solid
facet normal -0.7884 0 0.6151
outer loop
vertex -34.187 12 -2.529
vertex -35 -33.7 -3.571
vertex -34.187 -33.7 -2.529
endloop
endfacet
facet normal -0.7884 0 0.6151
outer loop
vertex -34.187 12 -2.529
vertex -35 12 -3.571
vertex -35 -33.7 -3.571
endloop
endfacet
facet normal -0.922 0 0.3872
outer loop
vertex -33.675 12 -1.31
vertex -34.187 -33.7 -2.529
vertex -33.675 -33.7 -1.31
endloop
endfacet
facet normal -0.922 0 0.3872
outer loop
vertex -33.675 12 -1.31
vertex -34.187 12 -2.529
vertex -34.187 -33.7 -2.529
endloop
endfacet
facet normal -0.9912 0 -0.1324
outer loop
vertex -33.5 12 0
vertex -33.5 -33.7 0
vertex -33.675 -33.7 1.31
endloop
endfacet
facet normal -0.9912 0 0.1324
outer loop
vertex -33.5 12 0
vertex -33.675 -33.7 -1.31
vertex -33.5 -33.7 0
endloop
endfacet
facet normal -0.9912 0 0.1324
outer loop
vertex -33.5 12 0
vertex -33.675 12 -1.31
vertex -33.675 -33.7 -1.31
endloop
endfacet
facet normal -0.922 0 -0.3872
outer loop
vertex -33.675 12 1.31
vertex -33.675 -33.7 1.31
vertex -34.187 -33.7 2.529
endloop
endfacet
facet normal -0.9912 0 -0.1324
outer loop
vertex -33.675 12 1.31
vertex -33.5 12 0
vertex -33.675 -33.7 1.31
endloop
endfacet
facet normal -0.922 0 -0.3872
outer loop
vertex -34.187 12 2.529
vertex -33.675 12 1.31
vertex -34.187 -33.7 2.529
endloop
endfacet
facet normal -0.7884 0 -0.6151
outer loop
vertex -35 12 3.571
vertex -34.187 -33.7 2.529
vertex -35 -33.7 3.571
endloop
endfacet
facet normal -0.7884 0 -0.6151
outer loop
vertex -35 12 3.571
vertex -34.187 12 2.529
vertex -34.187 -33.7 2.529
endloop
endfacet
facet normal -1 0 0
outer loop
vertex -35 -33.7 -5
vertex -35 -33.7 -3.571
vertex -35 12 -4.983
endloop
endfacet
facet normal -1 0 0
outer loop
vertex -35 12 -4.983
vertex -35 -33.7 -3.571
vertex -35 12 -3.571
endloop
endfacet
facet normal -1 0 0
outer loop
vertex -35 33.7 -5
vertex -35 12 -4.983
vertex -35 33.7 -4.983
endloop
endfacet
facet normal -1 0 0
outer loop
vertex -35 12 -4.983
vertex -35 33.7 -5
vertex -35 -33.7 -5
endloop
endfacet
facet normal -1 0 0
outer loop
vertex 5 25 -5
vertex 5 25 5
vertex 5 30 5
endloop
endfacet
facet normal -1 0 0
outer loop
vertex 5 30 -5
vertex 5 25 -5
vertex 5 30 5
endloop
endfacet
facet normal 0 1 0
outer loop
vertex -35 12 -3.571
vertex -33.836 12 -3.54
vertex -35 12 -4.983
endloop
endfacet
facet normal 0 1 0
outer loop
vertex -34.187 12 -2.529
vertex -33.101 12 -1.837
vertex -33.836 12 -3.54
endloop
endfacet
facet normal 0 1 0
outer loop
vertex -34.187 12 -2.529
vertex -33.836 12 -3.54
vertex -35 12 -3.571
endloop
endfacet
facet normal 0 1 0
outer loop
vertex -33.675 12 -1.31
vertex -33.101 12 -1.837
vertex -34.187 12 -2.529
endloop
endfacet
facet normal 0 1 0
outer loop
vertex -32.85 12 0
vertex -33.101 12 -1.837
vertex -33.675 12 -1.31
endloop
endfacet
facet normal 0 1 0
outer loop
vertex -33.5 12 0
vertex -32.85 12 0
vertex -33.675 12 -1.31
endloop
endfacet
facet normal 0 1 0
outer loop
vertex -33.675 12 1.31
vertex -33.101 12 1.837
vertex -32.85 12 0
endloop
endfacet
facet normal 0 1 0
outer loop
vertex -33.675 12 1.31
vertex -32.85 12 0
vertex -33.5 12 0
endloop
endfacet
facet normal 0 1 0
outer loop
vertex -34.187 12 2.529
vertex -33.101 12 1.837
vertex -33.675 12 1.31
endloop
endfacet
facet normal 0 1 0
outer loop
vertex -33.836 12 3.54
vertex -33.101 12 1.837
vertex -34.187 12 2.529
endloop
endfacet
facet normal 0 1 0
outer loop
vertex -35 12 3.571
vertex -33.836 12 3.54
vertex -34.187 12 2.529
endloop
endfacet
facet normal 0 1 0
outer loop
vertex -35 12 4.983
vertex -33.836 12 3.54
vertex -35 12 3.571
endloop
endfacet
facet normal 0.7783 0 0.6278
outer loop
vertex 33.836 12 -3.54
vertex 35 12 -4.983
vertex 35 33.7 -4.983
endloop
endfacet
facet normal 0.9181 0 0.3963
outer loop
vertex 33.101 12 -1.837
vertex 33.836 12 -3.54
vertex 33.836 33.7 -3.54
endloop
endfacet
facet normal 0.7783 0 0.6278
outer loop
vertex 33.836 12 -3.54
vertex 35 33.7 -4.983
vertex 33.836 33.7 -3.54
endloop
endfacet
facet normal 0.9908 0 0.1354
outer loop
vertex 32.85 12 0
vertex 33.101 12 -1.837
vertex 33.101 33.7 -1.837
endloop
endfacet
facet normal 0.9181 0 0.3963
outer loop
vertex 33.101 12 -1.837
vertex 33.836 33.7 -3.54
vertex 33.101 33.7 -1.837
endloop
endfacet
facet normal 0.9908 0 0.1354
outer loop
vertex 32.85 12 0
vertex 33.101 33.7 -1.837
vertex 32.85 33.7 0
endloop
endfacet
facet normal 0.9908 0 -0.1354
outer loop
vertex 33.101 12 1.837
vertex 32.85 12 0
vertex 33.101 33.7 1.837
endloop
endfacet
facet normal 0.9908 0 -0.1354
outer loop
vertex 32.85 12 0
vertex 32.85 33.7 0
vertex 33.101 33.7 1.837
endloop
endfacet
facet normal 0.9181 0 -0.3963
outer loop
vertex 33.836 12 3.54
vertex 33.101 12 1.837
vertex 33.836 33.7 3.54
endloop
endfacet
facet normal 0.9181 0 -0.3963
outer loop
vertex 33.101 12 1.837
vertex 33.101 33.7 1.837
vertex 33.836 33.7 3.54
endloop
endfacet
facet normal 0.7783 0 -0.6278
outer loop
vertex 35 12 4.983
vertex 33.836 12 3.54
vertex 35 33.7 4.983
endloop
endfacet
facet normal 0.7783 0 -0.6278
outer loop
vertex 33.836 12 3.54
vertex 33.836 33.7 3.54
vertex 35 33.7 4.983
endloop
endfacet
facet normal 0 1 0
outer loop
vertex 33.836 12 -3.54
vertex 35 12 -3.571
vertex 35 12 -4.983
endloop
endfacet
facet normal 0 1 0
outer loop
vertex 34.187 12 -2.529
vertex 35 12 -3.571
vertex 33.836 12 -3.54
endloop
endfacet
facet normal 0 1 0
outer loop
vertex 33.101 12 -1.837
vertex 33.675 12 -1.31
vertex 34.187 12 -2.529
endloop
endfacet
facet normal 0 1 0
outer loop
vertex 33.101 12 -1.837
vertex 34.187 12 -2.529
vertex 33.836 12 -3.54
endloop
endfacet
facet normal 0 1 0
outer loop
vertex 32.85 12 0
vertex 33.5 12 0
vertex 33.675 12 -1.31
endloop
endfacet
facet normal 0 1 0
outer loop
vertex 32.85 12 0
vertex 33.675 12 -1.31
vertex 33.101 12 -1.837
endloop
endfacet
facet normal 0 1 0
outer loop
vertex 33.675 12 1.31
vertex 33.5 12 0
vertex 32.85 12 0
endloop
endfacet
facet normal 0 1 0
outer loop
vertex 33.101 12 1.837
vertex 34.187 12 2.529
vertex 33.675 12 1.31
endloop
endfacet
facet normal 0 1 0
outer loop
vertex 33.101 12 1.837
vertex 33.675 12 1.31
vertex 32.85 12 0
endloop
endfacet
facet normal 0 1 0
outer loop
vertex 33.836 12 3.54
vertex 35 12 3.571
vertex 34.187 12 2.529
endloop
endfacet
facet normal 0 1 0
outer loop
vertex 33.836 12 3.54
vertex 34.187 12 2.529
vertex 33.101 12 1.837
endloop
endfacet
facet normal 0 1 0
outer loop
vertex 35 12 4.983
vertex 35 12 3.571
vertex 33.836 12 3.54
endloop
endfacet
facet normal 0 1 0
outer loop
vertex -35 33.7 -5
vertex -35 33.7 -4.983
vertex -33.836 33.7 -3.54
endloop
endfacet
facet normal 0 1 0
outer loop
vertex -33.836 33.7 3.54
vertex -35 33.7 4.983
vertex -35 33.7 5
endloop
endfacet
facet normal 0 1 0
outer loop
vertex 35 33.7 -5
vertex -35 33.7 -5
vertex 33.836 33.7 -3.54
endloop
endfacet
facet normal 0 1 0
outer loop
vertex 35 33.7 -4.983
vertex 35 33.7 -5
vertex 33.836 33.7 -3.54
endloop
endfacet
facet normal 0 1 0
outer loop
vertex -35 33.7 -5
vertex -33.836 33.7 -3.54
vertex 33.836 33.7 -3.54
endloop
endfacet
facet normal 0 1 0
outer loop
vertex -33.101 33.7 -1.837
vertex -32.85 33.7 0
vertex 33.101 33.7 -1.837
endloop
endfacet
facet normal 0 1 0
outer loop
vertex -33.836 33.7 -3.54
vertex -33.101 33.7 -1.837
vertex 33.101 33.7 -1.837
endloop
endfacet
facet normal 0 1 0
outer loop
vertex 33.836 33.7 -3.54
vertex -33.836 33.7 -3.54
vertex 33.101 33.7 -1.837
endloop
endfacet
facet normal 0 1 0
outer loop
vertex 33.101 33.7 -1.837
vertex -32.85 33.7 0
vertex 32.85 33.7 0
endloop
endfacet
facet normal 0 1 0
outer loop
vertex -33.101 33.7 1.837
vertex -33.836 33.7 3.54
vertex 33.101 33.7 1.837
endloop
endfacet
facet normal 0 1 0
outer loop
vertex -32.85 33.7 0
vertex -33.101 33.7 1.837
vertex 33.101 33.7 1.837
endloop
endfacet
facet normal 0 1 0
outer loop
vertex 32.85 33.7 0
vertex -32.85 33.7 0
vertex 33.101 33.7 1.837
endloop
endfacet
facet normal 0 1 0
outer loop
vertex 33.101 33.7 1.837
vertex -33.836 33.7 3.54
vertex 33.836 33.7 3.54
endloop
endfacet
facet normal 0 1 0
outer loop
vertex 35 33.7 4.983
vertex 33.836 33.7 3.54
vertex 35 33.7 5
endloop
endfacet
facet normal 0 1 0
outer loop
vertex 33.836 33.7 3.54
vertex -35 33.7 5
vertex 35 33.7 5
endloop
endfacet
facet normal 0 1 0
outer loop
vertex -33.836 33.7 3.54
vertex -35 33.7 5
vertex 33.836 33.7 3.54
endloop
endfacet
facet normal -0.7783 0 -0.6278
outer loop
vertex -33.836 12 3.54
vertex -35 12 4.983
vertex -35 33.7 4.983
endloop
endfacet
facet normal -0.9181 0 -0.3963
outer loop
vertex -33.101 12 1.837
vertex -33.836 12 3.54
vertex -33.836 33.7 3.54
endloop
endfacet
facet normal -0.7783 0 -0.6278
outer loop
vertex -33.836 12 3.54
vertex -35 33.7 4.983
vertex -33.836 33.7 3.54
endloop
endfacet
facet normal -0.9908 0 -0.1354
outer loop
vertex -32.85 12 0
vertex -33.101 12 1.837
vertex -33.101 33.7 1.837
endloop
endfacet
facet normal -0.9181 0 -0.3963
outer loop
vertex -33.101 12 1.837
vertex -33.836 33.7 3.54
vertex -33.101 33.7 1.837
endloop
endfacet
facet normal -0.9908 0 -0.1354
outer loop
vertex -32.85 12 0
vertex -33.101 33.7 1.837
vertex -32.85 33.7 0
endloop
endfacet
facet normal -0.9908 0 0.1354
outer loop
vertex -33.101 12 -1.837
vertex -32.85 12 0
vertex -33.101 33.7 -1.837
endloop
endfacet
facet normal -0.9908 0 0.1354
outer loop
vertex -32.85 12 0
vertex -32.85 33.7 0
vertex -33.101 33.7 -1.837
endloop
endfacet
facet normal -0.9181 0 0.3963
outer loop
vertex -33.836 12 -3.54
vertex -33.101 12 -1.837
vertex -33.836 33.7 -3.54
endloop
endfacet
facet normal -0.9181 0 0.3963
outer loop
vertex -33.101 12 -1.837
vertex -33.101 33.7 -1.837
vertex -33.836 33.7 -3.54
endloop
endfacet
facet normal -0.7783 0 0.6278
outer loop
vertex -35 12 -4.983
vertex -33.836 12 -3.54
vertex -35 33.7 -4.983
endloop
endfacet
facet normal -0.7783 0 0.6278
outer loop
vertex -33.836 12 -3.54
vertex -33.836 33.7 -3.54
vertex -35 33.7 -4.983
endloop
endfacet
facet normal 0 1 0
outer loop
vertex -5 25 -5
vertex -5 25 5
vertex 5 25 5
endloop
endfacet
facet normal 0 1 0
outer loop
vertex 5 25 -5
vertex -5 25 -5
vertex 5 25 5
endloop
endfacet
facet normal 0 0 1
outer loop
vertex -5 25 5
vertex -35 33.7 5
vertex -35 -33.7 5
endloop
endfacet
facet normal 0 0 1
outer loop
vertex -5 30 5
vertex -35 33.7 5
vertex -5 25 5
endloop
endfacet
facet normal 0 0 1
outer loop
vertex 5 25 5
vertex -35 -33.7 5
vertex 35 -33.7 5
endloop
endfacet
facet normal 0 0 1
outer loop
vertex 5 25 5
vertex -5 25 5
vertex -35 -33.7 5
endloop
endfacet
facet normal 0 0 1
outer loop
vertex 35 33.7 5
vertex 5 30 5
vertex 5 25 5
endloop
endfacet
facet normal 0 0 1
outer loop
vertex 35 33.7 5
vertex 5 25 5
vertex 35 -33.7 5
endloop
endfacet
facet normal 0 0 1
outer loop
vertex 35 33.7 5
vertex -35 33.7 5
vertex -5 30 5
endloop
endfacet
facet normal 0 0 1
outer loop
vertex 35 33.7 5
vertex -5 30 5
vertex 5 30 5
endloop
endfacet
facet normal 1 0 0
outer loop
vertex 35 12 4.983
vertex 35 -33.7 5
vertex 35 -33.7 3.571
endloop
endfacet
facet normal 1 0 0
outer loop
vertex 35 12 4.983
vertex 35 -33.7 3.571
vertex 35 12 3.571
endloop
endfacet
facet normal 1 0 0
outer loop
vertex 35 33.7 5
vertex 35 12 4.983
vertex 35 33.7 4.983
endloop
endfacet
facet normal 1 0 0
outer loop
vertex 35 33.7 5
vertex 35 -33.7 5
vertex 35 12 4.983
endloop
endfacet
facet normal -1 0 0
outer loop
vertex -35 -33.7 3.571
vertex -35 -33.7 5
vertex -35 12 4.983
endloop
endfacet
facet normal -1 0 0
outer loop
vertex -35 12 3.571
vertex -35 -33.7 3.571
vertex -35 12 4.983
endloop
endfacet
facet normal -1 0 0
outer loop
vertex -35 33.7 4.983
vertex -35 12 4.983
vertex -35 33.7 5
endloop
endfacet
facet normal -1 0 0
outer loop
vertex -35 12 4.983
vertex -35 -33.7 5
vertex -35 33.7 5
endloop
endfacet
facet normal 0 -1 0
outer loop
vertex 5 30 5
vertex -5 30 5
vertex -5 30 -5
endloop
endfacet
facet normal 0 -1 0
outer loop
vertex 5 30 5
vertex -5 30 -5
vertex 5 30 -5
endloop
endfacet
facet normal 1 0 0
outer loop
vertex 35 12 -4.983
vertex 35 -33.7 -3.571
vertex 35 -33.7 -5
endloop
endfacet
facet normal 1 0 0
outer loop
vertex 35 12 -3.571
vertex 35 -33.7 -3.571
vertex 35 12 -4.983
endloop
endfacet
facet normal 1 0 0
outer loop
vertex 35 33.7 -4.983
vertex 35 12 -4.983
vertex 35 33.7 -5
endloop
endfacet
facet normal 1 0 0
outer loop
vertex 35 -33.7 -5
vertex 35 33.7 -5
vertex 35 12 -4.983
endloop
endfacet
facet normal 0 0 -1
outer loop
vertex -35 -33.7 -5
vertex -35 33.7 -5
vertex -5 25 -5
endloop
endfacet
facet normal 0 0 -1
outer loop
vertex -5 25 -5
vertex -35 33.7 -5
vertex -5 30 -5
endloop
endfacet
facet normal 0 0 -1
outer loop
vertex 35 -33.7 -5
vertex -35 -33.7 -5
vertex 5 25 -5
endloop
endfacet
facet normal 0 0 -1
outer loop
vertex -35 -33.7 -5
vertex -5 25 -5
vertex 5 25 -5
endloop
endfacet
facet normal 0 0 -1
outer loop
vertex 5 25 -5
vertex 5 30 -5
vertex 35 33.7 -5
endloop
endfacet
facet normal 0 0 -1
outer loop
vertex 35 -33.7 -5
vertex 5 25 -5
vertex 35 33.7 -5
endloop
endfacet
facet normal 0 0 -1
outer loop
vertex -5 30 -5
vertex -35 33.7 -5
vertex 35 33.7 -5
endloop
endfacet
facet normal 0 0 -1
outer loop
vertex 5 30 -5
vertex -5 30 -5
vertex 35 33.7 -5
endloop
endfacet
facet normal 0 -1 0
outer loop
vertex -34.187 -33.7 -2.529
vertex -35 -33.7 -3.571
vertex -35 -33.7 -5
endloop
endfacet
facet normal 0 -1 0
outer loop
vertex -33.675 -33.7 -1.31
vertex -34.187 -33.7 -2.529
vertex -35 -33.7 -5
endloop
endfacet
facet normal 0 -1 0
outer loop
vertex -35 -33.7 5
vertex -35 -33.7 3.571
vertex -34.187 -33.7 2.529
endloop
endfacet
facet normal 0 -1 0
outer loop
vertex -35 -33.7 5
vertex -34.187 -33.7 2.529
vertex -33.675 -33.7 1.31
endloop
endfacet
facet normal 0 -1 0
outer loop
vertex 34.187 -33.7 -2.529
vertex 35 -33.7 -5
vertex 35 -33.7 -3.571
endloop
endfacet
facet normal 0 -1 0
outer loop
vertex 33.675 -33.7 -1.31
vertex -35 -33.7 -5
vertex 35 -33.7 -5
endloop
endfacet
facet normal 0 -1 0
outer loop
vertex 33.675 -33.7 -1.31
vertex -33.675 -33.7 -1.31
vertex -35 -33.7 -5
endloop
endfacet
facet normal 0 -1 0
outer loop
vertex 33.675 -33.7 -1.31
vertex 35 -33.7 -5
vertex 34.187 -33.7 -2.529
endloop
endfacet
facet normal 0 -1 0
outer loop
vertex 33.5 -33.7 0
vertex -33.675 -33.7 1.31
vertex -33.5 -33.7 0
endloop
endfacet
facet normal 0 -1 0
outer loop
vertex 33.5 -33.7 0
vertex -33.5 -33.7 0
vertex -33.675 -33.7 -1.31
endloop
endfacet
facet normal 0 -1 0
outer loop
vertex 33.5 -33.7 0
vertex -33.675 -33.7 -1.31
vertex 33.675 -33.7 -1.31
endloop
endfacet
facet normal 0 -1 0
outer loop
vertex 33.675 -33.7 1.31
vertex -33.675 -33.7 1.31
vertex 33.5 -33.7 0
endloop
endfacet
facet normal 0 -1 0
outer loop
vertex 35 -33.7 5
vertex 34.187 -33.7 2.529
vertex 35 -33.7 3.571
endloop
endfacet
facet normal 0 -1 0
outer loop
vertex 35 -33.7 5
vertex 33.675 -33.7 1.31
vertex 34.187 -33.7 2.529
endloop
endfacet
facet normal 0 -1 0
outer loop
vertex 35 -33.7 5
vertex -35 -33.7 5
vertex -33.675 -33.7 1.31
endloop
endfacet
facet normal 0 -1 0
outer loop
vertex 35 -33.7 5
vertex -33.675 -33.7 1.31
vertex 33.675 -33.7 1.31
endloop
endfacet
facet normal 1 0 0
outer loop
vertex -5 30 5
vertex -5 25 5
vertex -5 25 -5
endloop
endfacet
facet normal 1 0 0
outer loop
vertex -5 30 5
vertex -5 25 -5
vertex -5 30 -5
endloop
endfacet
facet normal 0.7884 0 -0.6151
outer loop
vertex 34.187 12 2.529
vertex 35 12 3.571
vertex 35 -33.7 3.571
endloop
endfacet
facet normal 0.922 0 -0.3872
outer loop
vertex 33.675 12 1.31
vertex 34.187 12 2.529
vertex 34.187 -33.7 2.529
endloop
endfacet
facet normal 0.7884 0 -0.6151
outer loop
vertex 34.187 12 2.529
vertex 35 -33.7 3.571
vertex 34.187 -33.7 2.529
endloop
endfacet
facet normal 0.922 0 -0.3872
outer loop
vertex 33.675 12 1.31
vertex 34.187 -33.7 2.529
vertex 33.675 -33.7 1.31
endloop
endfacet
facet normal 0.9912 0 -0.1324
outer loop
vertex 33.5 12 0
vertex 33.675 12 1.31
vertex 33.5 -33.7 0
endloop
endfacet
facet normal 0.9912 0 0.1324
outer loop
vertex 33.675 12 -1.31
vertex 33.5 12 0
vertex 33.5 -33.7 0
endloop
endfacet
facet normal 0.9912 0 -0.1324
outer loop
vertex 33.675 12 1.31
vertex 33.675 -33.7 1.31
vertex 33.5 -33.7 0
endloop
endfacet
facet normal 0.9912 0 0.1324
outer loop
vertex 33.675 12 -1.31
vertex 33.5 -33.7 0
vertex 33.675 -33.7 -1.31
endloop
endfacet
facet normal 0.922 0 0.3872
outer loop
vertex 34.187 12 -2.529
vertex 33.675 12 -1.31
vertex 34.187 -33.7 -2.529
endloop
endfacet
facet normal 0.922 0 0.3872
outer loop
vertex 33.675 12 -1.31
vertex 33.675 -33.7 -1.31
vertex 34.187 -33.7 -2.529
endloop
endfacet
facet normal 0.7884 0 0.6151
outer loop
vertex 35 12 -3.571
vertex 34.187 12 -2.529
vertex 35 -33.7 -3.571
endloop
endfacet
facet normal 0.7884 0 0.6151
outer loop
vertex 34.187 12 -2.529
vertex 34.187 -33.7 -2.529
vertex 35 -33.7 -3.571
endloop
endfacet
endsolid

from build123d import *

# Parameters (mm, degrees)
SKETCH001_R     = 5
PAD001_DEPTH    = 35
SKETCH_W        = 70
SKETCH_H        = 67.4
PAD_DEPTH       = 5
SKETCH002_W     = 10
SKETCH002_H     = 5
POCKET_DEPTH    = 10.001
SKETCH003_R     = 6.85
POCKET001_DEPTH = 21.7


with BuildPart() as pad001:
    # Sketch001 → Pad001 (new body, symmetric)
    with BuildSketch(Plane.XZ):
        with Locations((-38.5, 0)):
            Circle(SKETCH001_R)
        with Locations((38.5, 0)):
            Circle(SKETCH001_R)
    extrude(amount=PAD001_DEPTH, both=True)


with BuildPart() as pocket001:
    # Sketch → Pad (new body, symmetric)
    with BuildSketch(Plane.XY):
        Rectangle(SKETCH_W, SKETCH_H)
    extrude(amount=PAD_DEPTH, both=True)

    # Cut: cut Pad001
    add(pad001.part, mode=Mode.SUBTRACT)

    # Sketch002 → Pocket (cut, through all)
    with BuildSketch(Plane.XY.offset(5)):
        with Locations((0, 27.5)):
            Rectangle(SKETCH002_W, SKETCH002_H)
    extrude(amount=-POCKET_DEPTH, mode=Mode.SUBTRACT)

    # Sketch003 → Pocket001 (cut)
    with BuildSketch(Plane(origin=(0, 33.7, 0), x_dir=(-1, 0, 0), z_dir=(0, 1, 0))):
        with Locations((-39.7, 0)):
            Circle(SKETCH003_R)
        with Locations((39.7, 0)):
            Circle(SKETCH003_R)
    extrude(amount=-POCKET001_DEPTH, mode=Mode.SUBTRACT)


solid = pocket001.part
